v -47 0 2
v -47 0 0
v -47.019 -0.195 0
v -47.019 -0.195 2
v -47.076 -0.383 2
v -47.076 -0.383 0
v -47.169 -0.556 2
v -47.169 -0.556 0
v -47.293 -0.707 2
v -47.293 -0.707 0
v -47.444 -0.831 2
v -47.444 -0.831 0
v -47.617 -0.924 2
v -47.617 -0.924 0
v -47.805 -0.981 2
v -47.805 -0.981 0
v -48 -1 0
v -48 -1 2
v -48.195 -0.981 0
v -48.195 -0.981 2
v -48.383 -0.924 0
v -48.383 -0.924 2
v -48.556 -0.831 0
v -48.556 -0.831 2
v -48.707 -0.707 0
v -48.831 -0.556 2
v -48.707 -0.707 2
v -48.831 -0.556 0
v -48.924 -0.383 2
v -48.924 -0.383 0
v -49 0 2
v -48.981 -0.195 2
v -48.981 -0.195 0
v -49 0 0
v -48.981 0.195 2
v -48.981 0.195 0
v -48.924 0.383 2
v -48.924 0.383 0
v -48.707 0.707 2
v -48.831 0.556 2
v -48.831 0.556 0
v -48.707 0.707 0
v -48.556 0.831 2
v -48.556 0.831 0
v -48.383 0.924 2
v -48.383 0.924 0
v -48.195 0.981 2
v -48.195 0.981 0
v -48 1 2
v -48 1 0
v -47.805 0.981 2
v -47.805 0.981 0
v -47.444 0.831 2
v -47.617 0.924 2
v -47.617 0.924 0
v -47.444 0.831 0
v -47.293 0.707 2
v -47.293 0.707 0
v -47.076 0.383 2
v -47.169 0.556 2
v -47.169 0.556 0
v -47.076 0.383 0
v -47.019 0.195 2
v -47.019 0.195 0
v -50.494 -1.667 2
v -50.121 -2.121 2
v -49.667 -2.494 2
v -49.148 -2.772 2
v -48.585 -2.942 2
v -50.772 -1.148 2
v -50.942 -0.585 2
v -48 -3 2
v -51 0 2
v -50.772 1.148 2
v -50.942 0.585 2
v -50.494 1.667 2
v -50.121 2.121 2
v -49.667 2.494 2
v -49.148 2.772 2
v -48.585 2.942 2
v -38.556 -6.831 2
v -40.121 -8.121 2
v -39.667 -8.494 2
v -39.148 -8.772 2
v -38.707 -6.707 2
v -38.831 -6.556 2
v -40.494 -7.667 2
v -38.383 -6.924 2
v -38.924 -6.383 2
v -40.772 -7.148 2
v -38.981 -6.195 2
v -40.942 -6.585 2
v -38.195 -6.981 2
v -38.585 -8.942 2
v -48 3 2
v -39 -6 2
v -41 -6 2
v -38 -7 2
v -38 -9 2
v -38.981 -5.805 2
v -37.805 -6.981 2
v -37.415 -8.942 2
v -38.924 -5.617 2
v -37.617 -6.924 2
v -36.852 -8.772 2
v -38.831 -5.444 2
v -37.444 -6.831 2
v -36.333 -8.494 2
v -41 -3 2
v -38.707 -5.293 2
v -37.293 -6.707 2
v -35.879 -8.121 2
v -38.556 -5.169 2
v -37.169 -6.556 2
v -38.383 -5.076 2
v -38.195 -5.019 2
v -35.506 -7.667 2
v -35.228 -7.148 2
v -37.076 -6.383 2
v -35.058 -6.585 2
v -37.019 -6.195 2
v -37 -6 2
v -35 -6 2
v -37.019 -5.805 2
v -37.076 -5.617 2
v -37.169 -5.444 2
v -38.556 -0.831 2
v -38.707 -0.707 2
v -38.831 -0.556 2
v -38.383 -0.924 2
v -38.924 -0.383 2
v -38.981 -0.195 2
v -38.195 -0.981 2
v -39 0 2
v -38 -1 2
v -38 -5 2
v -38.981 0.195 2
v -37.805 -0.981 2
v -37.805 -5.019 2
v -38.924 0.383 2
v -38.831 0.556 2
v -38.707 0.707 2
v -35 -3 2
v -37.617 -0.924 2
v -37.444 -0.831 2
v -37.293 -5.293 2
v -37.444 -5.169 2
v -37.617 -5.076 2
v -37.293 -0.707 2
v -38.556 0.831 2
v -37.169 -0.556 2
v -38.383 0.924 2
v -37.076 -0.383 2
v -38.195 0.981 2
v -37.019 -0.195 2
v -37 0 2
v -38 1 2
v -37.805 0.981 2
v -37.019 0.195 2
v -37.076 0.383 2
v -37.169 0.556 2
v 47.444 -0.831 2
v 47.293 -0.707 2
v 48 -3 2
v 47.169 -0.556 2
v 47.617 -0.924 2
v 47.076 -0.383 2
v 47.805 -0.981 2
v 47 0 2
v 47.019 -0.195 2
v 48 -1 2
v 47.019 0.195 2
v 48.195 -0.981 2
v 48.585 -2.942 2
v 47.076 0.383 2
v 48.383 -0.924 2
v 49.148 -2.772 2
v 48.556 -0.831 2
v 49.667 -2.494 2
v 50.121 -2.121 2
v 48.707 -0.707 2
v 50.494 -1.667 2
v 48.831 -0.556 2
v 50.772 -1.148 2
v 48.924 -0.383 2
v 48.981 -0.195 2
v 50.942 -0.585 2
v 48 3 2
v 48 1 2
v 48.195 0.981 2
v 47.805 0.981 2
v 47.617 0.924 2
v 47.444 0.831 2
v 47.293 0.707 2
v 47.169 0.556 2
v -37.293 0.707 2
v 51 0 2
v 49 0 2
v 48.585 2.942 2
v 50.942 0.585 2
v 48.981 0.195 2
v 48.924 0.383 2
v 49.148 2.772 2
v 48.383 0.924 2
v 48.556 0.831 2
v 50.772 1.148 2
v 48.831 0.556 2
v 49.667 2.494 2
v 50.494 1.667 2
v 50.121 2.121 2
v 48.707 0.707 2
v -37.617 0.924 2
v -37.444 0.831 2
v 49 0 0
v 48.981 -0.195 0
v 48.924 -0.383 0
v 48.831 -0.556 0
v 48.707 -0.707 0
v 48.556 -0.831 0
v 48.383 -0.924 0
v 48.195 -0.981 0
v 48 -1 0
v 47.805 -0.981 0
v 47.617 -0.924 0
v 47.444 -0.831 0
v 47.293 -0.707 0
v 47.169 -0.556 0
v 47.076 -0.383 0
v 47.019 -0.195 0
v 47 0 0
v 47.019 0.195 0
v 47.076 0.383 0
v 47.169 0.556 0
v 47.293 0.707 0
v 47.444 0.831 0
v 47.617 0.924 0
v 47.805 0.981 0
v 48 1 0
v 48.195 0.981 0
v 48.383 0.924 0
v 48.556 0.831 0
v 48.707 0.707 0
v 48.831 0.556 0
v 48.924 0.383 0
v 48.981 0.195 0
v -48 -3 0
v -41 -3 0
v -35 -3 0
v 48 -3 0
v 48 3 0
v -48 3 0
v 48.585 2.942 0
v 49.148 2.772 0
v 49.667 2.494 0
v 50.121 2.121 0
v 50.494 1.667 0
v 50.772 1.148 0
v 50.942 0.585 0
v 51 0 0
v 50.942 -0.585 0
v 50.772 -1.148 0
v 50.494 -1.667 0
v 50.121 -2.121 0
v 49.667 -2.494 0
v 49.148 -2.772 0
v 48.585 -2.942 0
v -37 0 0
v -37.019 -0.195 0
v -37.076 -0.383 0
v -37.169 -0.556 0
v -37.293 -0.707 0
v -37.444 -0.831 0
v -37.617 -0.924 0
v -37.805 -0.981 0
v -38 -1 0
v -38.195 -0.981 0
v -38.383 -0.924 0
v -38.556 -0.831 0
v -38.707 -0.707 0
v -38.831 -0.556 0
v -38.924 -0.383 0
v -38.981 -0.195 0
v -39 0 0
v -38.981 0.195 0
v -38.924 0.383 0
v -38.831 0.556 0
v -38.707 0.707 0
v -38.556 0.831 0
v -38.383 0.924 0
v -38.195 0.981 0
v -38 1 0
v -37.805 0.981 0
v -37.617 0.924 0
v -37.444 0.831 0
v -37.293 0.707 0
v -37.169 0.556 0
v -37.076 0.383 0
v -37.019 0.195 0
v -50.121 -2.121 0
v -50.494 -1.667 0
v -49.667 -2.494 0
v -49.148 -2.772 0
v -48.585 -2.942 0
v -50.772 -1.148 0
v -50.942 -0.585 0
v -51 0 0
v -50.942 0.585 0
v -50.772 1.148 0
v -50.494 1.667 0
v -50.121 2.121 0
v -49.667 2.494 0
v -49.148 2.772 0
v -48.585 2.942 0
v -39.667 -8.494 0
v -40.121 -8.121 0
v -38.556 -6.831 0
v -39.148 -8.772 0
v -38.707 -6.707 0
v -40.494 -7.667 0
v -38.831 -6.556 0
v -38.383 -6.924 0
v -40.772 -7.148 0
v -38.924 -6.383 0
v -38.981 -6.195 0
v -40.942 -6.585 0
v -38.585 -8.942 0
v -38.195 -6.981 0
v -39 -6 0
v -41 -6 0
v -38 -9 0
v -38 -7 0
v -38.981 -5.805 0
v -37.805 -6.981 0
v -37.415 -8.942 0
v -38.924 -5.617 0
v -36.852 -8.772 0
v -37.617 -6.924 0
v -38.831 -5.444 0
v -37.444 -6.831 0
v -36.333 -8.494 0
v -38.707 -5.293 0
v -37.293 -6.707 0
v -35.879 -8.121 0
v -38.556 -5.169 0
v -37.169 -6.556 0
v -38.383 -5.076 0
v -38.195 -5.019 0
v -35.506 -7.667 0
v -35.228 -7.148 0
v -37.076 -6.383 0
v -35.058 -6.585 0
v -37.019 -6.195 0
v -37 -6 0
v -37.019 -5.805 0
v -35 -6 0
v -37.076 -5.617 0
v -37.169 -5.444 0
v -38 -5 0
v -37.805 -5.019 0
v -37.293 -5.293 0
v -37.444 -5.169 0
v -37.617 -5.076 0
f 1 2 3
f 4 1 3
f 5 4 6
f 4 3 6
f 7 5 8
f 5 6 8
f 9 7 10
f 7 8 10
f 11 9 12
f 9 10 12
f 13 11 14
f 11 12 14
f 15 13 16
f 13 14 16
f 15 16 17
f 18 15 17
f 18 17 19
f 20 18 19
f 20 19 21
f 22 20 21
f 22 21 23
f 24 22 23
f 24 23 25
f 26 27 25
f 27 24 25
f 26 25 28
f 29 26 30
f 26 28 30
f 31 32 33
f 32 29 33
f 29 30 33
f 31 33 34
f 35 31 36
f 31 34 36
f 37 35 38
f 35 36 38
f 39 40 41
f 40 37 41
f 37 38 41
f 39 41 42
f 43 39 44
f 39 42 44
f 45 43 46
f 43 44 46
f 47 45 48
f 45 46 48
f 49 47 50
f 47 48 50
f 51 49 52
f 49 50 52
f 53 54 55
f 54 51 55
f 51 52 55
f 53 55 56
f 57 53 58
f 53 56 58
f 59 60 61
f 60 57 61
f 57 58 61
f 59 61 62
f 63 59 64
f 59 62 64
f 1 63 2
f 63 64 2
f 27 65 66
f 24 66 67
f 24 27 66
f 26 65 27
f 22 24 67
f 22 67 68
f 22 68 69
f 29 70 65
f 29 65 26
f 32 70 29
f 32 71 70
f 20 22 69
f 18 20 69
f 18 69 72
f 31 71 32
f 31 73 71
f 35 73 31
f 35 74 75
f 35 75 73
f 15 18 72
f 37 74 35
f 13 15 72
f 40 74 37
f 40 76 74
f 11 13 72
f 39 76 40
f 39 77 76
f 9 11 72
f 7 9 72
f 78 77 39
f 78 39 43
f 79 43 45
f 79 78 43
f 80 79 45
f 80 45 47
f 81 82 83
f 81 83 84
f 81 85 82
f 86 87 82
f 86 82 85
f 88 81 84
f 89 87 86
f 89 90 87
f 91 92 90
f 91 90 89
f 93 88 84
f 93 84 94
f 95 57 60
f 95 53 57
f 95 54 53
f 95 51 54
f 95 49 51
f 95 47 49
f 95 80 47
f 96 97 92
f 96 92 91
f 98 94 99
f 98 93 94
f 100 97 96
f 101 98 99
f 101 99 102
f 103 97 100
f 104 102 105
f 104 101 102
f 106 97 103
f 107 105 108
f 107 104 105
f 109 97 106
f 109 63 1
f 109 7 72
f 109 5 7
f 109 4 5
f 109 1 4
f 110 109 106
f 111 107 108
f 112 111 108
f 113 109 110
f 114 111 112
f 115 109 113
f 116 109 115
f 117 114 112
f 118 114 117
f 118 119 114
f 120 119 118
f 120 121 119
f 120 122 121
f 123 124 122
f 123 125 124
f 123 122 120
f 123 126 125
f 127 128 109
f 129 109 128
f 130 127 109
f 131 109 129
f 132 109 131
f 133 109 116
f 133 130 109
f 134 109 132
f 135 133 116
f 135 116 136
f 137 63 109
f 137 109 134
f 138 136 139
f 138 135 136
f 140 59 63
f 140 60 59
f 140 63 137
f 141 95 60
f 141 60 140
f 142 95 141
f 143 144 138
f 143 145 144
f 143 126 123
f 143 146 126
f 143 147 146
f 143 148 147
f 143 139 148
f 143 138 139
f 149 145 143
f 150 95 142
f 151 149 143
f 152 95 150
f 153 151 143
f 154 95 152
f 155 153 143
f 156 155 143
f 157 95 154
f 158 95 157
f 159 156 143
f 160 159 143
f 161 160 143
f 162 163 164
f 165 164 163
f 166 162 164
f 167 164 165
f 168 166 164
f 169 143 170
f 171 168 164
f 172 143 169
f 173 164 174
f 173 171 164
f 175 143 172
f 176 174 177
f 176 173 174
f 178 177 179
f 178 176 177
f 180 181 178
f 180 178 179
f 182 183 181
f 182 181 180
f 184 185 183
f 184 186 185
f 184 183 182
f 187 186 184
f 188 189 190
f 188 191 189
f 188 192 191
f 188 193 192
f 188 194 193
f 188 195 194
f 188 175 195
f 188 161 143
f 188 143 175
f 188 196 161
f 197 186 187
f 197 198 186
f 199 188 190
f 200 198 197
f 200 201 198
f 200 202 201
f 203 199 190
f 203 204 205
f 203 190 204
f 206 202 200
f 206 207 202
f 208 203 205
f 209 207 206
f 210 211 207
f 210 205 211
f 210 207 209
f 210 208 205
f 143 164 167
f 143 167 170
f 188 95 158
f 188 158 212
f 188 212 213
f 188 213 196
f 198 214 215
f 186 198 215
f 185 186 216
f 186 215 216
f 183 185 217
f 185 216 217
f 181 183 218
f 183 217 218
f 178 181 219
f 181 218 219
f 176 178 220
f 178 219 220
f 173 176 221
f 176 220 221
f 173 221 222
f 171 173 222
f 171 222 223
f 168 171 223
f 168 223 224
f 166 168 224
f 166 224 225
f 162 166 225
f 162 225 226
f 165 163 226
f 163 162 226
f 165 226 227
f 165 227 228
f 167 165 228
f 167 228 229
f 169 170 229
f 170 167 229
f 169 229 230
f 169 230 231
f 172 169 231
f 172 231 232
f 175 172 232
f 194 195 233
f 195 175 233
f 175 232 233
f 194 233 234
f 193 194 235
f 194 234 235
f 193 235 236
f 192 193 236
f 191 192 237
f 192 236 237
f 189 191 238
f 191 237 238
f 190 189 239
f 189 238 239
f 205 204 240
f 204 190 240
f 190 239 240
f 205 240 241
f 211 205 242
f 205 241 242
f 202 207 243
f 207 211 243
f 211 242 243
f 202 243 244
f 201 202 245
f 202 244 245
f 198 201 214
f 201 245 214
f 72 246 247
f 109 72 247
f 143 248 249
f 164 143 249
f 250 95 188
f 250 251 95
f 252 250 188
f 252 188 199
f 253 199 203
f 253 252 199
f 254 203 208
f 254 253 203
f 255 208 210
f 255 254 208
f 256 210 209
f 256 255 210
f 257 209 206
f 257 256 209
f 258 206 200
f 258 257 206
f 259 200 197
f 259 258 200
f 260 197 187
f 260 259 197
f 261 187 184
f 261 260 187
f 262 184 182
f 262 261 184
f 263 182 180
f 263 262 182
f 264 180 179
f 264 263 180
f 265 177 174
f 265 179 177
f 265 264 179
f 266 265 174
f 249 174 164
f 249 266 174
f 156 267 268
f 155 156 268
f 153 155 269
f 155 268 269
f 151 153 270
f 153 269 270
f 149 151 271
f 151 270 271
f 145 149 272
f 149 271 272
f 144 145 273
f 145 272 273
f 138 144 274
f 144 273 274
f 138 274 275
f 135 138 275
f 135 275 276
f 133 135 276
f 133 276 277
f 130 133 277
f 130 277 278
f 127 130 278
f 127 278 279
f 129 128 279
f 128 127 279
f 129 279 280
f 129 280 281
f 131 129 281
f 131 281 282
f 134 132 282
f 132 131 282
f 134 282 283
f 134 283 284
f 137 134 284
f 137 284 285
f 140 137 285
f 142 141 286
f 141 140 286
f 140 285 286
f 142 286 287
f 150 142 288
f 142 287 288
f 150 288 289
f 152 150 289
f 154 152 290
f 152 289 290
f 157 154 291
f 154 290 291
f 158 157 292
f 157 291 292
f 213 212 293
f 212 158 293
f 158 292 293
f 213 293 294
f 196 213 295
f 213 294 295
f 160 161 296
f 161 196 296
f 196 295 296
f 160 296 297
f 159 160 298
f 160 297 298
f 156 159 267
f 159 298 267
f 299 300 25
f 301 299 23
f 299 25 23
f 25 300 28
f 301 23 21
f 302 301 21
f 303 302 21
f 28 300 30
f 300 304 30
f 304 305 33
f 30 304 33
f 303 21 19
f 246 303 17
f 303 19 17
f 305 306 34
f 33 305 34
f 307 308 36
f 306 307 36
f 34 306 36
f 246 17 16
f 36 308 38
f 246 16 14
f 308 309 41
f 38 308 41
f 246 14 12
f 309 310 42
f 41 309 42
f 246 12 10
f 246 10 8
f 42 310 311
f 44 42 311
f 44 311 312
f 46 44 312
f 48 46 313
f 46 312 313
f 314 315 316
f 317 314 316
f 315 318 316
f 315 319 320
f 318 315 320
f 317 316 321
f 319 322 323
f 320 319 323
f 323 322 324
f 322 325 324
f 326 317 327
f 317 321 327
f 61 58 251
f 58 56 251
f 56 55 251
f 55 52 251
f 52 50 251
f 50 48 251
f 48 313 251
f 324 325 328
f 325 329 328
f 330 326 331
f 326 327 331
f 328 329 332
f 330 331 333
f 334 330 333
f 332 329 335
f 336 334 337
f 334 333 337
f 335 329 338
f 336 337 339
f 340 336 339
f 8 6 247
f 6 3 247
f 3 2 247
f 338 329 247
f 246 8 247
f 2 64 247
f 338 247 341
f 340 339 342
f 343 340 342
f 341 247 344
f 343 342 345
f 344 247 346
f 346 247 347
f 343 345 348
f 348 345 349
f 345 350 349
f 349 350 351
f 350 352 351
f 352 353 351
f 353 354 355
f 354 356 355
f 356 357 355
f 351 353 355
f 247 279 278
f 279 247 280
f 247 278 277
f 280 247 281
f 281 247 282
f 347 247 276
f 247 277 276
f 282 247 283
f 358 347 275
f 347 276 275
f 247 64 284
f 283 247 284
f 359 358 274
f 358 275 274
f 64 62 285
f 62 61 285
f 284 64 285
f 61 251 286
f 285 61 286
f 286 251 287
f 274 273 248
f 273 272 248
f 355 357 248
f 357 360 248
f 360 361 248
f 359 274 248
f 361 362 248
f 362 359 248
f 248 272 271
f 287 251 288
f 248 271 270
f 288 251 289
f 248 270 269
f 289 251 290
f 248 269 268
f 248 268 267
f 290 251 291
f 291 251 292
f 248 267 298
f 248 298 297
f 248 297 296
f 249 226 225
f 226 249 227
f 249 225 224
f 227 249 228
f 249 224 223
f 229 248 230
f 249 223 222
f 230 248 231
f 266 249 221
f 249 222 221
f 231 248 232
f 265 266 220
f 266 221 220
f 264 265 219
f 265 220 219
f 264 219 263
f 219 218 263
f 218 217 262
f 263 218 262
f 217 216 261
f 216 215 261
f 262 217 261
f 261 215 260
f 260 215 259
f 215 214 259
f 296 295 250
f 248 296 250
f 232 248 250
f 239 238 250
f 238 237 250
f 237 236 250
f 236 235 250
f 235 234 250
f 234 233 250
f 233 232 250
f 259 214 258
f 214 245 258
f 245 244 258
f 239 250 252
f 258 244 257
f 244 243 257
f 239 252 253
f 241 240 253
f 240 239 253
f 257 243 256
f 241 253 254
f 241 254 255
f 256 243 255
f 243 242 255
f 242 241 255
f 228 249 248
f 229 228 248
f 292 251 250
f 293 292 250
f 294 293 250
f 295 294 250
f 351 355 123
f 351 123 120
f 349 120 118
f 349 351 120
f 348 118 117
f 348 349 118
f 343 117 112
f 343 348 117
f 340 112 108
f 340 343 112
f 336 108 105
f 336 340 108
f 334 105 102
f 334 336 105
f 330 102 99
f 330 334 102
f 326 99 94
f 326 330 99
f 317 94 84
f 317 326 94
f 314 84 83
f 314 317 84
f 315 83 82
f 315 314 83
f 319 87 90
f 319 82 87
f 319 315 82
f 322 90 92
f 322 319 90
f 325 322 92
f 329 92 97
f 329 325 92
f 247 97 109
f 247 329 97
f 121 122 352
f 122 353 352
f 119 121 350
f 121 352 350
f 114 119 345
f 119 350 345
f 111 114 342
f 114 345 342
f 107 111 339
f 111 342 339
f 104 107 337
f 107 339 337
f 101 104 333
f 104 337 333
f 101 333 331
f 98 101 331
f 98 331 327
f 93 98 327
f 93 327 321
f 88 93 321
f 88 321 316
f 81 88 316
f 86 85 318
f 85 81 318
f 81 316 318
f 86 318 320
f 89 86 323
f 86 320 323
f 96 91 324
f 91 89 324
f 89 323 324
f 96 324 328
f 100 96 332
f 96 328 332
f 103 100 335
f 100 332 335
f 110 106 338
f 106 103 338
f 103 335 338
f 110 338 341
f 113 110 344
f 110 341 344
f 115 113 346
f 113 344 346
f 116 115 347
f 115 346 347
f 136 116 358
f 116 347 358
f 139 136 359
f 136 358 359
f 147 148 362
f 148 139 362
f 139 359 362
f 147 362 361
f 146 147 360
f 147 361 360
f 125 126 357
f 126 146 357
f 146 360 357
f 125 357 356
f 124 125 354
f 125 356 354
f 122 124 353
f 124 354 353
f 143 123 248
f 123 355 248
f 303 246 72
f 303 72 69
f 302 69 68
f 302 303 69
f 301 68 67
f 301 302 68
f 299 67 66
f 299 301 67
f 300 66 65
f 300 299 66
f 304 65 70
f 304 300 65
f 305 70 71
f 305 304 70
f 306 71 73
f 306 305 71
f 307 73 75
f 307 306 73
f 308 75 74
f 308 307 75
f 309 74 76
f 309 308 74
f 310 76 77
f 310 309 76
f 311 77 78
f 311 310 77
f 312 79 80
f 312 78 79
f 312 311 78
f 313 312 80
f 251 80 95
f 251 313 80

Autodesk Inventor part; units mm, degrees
ref_plane "YZ Plane" through (0, 0, 0) normal (1, 0, 0) x (0, 1, 0)
ref_plane "XZ Plane" through (0, 0, 0) normal (0, 1, 0) x (-1, 0, 0)
ref_plane "XY Plane" through (0, 0, 0) normal (0, 0, 1) x (1, 0, 0)
sketch "Sketch1" plane through (0, 0, 0) normal (0, 0, 1) x (1, 0, 0)
  circle A0 centre (-48, 0) radius 1
  circle A1 centre (48, 0) radius 1
  line L0 (-48, 0) -> (0, 0) construction
  line L1 (0, 0) -> (48, 0) construction
  line L2 (-48, 3) -> (48, 3)
  line L3 (-48, -3) -> (48, -3)
  line L4 (0, 3) -> (0, -3) construction
  arc A2 (-48, 3) -> (-48, -3) centre (-48, 0) ccw
  arc A3 (48, -3) -> (48, 3) centre (48, 0) ccw
  circle A4 centre (-38, 0) radius 1
  circle A5 centre (-38, -6) radius 3
  line L5 (-41, -6) -> (-41, -3)
  line L6 (-35, -6) -> (-35, -3)
  circle A6 centre (-38, -6) radius 1
  point P0 (-48, -1)
  dimension "d0" = 2
  dimension "d1" = 2
  dimension "d2" = 48
  dimension "d5" = 10
extrude "Extrusion1" add sketch "Sketch1" along normal blind 2
properties part number "Wing"
